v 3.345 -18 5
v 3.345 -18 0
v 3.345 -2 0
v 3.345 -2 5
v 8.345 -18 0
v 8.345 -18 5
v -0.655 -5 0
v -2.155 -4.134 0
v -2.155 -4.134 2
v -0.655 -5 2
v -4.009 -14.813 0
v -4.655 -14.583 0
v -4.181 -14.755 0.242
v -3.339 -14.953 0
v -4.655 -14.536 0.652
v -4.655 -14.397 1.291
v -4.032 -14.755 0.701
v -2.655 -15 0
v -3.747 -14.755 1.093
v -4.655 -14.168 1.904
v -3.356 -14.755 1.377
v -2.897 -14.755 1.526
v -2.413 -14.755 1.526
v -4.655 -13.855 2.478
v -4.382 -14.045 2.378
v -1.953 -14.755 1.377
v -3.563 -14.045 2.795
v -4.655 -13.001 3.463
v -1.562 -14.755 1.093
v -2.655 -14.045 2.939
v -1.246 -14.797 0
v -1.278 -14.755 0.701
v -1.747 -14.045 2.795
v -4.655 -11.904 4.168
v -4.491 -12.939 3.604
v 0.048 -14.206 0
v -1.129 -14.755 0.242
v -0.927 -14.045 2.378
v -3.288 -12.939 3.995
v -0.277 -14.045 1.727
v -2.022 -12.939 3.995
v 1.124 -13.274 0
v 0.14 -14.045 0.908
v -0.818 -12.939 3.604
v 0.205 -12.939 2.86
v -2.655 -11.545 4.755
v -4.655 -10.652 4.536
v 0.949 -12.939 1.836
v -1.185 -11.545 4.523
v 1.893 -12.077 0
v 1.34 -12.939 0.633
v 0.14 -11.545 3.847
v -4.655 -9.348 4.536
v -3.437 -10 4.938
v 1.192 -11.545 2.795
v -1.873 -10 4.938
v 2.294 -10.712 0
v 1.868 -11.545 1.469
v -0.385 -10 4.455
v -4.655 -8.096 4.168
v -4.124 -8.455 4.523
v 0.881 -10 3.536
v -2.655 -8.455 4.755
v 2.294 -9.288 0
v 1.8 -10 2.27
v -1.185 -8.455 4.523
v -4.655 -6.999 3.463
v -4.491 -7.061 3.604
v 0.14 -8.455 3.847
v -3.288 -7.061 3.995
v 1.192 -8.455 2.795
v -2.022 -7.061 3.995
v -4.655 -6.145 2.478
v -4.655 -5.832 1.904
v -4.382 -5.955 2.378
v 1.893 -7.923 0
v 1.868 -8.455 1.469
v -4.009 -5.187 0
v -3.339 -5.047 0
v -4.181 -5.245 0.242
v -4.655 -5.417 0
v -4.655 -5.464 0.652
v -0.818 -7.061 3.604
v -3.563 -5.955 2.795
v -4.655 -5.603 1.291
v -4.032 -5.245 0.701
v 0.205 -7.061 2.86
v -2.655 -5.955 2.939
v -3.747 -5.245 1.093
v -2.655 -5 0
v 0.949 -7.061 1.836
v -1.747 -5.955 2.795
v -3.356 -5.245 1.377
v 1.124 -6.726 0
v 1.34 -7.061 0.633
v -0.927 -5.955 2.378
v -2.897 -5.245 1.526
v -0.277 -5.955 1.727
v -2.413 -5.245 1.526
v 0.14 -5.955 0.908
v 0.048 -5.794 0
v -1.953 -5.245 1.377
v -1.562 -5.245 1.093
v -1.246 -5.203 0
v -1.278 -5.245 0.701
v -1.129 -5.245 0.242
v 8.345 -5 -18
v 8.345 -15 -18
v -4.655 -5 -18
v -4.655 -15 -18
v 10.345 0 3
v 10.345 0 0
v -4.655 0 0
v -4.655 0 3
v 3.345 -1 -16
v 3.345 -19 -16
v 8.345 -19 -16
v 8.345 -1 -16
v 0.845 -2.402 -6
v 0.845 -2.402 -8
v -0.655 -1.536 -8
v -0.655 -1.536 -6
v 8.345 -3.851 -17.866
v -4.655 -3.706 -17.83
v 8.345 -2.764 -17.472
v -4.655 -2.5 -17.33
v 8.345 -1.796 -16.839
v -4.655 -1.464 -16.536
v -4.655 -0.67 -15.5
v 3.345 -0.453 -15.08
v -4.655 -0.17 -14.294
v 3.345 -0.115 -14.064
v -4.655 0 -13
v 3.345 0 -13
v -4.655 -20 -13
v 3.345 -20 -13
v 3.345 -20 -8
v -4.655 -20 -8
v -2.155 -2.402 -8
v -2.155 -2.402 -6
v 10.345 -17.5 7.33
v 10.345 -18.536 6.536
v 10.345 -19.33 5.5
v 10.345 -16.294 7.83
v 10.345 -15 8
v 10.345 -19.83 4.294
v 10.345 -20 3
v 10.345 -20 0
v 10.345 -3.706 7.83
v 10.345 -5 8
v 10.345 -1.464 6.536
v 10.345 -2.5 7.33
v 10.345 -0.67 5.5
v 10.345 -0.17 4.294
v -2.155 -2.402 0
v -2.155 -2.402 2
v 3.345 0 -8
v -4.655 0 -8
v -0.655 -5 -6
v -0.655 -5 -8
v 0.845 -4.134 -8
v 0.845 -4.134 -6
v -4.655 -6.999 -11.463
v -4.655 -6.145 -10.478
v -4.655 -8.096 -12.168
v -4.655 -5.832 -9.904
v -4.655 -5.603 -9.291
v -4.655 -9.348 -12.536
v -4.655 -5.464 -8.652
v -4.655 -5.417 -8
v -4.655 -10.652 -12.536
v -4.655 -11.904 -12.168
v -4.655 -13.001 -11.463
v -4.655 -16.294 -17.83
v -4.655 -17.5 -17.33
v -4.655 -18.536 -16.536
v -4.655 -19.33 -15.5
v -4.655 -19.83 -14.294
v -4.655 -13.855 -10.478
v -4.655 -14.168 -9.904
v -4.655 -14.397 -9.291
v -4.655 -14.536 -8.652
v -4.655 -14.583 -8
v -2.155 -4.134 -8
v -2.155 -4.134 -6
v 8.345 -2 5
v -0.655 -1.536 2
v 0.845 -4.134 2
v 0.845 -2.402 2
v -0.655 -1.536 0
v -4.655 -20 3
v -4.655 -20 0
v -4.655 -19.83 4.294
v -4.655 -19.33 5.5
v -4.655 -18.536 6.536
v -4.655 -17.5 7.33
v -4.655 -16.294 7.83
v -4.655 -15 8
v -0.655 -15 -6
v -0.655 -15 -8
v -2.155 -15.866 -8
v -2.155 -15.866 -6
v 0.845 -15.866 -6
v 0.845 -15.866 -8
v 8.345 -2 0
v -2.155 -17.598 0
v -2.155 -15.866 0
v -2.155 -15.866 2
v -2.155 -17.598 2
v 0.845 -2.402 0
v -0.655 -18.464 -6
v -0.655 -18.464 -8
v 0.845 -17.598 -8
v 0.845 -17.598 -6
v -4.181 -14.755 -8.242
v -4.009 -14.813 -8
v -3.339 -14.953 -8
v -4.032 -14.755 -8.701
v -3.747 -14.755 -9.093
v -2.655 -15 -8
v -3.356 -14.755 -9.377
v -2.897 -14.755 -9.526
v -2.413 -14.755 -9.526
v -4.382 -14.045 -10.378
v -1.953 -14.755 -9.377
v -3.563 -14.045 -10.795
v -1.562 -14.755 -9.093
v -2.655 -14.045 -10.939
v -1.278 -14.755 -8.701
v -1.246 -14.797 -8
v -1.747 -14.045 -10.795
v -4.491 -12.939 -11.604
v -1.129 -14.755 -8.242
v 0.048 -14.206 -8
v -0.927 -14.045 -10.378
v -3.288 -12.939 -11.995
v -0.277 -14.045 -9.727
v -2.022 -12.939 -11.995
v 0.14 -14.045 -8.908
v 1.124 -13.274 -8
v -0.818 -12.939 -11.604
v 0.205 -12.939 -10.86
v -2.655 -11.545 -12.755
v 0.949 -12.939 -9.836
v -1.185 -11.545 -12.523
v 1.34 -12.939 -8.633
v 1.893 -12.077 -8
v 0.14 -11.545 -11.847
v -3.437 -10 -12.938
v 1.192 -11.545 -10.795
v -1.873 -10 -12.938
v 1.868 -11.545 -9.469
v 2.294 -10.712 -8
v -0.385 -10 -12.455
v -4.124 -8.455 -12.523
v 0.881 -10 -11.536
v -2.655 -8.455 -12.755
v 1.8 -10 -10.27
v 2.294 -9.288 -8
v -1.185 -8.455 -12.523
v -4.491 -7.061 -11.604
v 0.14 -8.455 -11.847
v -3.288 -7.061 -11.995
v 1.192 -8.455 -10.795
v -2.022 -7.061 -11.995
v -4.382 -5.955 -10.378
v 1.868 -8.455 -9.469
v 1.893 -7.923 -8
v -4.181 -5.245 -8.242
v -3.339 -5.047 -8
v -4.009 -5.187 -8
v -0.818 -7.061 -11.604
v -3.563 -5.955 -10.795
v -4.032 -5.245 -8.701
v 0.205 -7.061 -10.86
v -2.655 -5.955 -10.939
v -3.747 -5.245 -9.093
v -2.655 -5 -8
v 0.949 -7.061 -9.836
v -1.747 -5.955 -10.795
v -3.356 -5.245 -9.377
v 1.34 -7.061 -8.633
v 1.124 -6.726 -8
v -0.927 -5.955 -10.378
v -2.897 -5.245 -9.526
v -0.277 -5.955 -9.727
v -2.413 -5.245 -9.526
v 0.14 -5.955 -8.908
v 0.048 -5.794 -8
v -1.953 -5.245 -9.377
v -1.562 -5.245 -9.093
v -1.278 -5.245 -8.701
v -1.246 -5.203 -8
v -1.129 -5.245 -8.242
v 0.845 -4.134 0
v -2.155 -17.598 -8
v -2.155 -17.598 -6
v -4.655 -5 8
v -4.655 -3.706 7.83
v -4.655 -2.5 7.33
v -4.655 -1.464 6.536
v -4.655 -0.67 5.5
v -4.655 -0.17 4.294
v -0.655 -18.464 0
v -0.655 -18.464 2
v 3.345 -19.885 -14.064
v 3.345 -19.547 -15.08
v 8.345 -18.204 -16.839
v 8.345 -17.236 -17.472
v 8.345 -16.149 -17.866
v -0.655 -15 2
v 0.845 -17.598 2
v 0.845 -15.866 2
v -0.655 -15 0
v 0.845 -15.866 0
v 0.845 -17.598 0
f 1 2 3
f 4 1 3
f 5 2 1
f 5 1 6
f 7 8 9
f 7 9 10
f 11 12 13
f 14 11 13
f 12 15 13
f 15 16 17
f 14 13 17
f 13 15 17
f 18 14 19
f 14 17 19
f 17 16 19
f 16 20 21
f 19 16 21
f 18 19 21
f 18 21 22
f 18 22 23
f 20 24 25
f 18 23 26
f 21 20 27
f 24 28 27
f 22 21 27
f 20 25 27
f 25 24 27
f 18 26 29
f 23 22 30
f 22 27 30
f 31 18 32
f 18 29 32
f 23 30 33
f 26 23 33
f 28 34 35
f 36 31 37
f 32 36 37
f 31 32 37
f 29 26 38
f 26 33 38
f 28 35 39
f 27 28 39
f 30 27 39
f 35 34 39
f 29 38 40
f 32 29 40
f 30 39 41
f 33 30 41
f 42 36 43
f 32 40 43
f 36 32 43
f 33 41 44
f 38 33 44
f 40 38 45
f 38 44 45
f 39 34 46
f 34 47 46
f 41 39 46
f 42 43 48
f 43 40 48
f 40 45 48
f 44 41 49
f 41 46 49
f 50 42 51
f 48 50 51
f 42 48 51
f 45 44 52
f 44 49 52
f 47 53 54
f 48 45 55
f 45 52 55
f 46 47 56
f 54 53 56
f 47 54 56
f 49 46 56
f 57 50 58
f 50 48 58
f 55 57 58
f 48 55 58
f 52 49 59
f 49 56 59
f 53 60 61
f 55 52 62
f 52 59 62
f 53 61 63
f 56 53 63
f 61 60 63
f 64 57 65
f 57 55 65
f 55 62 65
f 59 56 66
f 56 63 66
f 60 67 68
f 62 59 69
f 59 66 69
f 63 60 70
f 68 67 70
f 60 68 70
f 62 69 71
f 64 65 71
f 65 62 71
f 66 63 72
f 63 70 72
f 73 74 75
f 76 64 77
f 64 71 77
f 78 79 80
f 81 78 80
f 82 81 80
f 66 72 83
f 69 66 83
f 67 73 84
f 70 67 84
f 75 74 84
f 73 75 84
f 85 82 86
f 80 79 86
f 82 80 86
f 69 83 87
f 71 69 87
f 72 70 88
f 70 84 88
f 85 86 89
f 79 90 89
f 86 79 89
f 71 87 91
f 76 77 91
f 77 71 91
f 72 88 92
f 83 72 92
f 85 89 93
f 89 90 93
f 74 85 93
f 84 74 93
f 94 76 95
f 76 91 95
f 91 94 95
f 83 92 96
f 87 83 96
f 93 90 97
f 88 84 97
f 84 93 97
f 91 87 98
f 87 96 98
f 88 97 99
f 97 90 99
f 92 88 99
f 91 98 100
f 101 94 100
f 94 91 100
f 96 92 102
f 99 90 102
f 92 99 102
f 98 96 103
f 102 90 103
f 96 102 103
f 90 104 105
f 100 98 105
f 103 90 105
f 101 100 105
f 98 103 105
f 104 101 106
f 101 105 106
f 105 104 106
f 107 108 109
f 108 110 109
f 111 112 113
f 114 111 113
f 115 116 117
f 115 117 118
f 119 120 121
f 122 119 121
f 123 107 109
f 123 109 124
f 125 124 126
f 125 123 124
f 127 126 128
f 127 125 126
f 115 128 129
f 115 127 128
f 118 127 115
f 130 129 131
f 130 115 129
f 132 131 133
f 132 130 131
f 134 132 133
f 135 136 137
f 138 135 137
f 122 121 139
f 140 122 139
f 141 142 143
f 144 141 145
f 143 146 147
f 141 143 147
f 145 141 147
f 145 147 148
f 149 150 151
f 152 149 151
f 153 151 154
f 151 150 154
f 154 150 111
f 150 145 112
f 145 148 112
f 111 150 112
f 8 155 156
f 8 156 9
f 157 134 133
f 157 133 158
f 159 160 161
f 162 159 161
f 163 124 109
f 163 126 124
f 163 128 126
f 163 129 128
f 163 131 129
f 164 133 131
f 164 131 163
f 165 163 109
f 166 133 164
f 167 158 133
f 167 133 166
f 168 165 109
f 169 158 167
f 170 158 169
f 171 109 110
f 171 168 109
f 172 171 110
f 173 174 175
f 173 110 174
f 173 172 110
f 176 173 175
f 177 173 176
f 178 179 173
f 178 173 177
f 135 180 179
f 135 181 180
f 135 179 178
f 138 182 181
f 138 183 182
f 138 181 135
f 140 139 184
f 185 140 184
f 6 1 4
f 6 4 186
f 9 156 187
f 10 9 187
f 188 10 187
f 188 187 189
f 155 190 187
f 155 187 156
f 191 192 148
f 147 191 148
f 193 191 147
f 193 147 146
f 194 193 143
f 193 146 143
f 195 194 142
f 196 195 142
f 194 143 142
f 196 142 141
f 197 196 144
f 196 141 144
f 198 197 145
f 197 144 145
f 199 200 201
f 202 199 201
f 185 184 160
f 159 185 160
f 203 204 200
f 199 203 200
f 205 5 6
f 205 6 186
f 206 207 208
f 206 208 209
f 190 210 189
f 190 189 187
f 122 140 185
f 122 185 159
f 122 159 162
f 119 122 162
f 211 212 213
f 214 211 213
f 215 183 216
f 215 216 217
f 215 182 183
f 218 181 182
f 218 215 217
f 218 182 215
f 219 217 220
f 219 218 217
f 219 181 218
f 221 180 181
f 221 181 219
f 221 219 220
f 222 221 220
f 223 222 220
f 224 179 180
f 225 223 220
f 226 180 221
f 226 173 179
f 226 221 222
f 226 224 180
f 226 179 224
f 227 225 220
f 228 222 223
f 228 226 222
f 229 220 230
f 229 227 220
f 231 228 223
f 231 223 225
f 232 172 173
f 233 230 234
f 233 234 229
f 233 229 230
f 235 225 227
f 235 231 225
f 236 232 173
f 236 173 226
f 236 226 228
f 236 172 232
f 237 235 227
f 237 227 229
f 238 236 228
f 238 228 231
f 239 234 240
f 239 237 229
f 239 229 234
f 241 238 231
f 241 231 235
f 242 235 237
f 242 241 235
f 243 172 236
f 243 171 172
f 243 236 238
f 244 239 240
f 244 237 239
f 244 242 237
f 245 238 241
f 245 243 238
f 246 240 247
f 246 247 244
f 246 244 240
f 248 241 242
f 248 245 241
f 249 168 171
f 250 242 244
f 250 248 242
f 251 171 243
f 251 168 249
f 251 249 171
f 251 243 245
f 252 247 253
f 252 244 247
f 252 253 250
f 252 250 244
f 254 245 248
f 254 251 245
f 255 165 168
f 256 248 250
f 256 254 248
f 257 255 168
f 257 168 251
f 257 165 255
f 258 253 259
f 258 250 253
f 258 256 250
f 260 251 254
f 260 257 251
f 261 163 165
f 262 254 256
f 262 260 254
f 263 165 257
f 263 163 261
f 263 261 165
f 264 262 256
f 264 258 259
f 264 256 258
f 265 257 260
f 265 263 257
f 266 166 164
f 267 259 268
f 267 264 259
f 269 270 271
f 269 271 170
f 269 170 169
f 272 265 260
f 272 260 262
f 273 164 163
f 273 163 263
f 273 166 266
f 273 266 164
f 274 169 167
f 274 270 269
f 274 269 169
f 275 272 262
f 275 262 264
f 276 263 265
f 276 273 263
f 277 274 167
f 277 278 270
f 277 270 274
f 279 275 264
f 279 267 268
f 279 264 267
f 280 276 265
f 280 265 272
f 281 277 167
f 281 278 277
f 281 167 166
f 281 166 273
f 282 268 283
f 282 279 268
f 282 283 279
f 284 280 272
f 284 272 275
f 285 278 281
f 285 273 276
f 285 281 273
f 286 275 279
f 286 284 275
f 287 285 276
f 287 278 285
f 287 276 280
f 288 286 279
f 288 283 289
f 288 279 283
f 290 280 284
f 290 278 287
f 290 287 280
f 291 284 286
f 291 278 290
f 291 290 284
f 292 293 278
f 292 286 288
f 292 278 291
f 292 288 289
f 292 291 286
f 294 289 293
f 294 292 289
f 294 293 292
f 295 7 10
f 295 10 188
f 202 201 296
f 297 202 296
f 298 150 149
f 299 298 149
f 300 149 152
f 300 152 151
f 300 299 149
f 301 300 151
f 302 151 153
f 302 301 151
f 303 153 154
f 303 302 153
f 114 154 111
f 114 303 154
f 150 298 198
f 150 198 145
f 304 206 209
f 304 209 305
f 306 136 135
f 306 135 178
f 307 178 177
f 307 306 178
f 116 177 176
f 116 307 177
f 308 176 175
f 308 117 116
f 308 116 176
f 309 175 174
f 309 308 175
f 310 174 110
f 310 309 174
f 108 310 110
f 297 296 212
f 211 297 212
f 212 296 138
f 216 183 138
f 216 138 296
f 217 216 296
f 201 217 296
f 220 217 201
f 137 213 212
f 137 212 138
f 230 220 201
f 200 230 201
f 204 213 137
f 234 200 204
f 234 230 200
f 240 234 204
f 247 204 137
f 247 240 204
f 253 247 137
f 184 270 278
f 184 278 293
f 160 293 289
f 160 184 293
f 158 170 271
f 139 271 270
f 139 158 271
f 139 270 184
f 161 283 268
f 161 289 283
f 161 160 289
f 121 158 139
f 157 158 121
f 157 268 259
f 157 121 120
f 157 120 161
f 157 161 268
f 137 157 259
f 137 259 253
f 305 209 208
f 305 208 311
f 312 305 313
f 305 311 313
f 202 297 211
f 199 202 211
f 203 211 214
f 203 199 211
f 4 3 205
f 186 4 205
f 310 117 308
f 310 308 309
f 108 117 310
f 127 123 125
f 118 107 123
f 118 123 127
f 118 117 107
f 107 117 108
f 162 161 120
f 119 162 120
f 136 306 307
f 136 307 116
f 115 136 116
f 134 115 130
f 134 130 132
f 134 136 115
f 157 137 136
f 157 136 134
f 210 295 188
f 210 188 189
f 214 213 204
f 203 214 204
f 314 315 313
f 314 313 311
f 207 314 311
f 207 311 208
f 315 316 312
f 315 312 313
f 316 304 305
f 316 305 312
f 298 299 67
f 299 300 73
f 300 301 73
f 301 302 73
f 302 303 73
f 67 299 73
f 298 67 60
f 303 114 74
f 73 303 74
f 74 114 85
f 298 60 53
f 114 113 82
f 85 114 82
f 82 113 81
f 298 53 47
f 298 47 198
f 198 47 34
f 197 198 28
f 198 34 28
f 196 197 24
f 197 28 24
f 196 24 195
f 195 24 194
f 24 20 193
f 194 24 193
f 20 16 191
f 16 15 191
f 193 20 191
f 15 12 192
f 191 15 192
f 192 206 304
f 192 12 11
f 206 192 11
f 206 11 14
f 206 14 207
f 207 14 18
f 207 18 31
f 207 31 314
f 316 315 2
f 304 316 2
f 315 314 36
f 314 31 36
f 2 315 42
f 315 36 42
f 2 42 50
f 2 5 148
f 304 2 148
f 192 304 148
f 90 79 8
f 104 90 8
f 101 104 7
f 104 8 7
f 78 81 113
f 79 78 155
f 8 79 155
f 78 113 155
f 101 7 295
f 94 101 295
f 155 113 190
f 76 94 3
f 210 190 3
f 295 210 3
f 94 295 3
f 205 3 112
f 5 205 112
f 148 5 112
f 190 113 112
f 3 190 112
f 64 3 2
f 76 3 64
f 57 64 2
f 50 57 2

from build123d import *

# Parameters (mm, degrees)
F0_W      = 5
F0_H      = 2
F0_H_2    = 16
F1_DEPTH  = 6
F2_DEPTH  = 5
F4_DEPTH  = 2
F7_W      = 7
F7_H      = 20
F8_DEPTH  = 6.001
F9_DEPTH  = 4
F10_DEPTH = 2
F11_DEPTH = 2
F12_W     = 20
F12_H     = 2
F13_DEPTH = 5
F14_DEPTH = 2
F15_R     = 5
F15_2_R   = 5


with BuildPart() as f1:
    # F0 (on Top) → F1 (new body)
    with BuildSketch(Plane.XY):
        with BuildLine():
            Line((3.3451463953, 0), (-4.6548536047, 0))
            Line((-4.6548536047, 0), (-4.6548536047, -5.417424305))
            ThreePointArc((-4.6548536047, -5.417424305), (-3.6764018232, -5.1054684353), (-2.6548536047, -5))
            ThreePointArc((-2.6548536047, -5), (2.3451463953, -10), (-2.6548536047, -15))
            ThreePointArc((-2.6548536047, -15), (-3.6764018232, -14.8945315647), (-4.6548536047, -14.582575695))
            Line((-4.6548536047, -14.582575695), (-4.6548536047, -20))
            Line((-4.6548536047, -20), (3.3451463953, -20))
            Line((3.3451463953, -20), (3.3451463953, -18))
            Line((3.3451463953, -18), (3.3451463953, -2))
            Line((3.3451463953, -2), (3.3451463953, 0))
        make_face()
        Polygon((-0.6548536047, -18.4641016151), (-2.1548536047, -17.5980762114), (-2.1548536047, -15.8660254038), (-0.6548536047, -15), (0.8451463953, -15.8660254038), (0.8451463953, -17.5980762114), align=None, mode=Mode.SUBTRACT)
        Polygon((-2.1548536047, -4.1339745962), (-2.1548536047, -2.4019237886), (-0.6548536047, -1.5358983849), (0.8451463953, -2.4019237886), (0.8451463953, -4.1339745962), (-0.6548536047, -5), align=None, mode=Mode.SUBTRACT)
        with Locations((5.8451463953, -1)):
            Rectangle(F0_W, F0_H)
        with BuildLine():
            ThreePointArc((-2.6548536047, -5), (-3.6764018232, -5.1054684353), (-4.6548536047, -5.417424305))
            Line((-4.6548536047, -5.417424305), (-4.6548536047, -14.582575695))
            ThreePointArc((-4.6548536047, -14.582575695), (-3.6764018232, -14.8945315647), (-2.6548536047, -15))
            Line((-2.6548536047, -15), (-2.6548536047, -5))
        make_face()
        Polygon((10.3451463953, 0), (8.3451463953, 0), (8.3451463953, -2), (8.3451463953, -18), (8.3451463953, -20), (10.3451463953, -20), align=None)
        with Locations((5.8451463953, -19)):
            Rectangle(F0_W, F0_H)
        with Locations((5.8451463953, -10)):
            Rectangle(F0_W, F0_H_2)
        with BuildLine():
            ThreePointArc((-2.6548536047, -15), (2.3451463953, -10), (-2.6548536047, -5))
            Line((-2.6548536047, -5), (-2.6548536047, -15))
        make_face()
        Polygon((-2.1548536047, -15.8660254038), (-2.1548536047, -17.5980762114), (-0.6548536047, -18.4641016151), (0.8451463953, -17.5980762114), (0.8451463953, -15.8660254038), (-0.6548536047, -15), align=None)
        Polygon((-0.6548536047, -1.5358983849), (-2.1548536047, -2.4019237886), (-2.1548536047, -4.1339745962), (-0.6548536047, -5), (0.8451463953, -4.1339745962), (0.8451463953, -2.4019237886), align=None)
    extrude(amount=F1_DEPTH)

    # F0 (on Top) → F2 (cut)
    with BuildSketch(Plane.XY):
        with Locations((5.8451463953, -10)):
            Rectangle(F0_W, F0_H_2)
    extrude(amount=F2_DEPTH, mode=Mode.SUBTRACT)

    # F0 (on Top) → F3 (revolve, cut)
    with BuildSketch(Plane.XY):
        with BuildLine():
            ThreePointArc((-2.6548536047, -15), (2.3451463953, -10), (-2.6548536047, -5))
            Line((-2.6548536047, -5), (-2.6548536047, -15))
        make_face()
    revolve(axis=Axis((-2.6548536047, -10, 0), (0, 1, 0)), mode=Mode.SUBTRACT)

    # F0 (on Top) → F4 (cut)
    with BuildSketch(Plane.XY):
        Polygon((-2.1548536047, -15.8660254038), (-2.1548536047, -17.5980762114), (-0.6548536047, -18.4641016151), (0.8451463953, -17.5980762114), (0.8451463953, -15.8660254038), (-0.6548536047, -15), align=None)
        Polygon((-0.6548536047, -1.5358983849), (-2.1548536047, -2.4019237886), (-2.1548536047, -4.1339745962), (-0.6548536047, -5), (0.8451463953, -4.1339745962), (0.8451463953, -2.4019237886), align=None)
    extrude(amount=F4_DEPTH, mode=Mode.SUBTRACT)


with BuildPart() as f6_1:
    # F6: instance of F1
    add(f1.part.mirror(Plane.XY.offset(-4)))

    # F7 (on face) → F8 (cut, through all)
    with BuildSketch(Plane.XY.offset(-8)):
        with Locations((6.8451463953, -10)):
            Rectangle(F7_W, F7_H)
    extrude(amount=-F8_DEPTH, mode=Mode.SUBTRACT)

    # F9 (add): faces of the model
    f9_faces = [f6_1.faces().sort_by_distance(p)[0] for p in [
        (-0.6548536047, -3.2679491924, -10),
        (-0.6548536047, -16.7320508076, -10),
    ]]
    extrude(f9_faces, amount=F9_DEPTH)

    # F10 (add): a face of the model
    f10_faces = [f6_1.faces().sort_by_distance(p)[0] for p in [
        (-0.6548536047, -10, -14),
    ]]
    extrude(f10_faces, amount=F10_DEPTH)

    # F11 (add): a face of the model
    f11_faces = [f6_1.faces().sort_by_distance(p)[0] for p in [
        (-0.6548536047, -10, -16),
    ]]
    extrude(f11_faces, amount=F11_DEPTH)

    # F12 (on face) → F13 (join)
    with BuildSketch(Plane.YZ.offset(3.3451463953)):
        with Locations((-10, -17)):
            Rectangle(F12_W, F12_H)
    extrude(amount=F13_DEPTH)

    # F15#2
    f15_2_edges = [f6_1.edges().sort_by_distance(p)[0] for p in [
        (1.845146, 0, -18),
        (1.845146, -20, -18),
    ]]
    fillet(f15_2_edges, radius=F15_2_R)


with BuildPart() as f1_1:
    add(f1.part)

    # F14 (add): a face of the model
    f14_faces = [f1_1.faces().sort_by_distance(p)[0] for p in [
        (2.8451463953, -10, 6),
    ]]
    extrude(f14_faces, amount=F14_DEPTH)

    # F15
    f15_edges = [f1_1.edges().sort_by_distance(p)[0] for p in [
        (2.845146, -20, 8),
        (2.845146, 0, 8),
    ]]
    fillet(f15_edges, radius=F15_R)


solid = Compound([f6_1.part, f1_1.part])
